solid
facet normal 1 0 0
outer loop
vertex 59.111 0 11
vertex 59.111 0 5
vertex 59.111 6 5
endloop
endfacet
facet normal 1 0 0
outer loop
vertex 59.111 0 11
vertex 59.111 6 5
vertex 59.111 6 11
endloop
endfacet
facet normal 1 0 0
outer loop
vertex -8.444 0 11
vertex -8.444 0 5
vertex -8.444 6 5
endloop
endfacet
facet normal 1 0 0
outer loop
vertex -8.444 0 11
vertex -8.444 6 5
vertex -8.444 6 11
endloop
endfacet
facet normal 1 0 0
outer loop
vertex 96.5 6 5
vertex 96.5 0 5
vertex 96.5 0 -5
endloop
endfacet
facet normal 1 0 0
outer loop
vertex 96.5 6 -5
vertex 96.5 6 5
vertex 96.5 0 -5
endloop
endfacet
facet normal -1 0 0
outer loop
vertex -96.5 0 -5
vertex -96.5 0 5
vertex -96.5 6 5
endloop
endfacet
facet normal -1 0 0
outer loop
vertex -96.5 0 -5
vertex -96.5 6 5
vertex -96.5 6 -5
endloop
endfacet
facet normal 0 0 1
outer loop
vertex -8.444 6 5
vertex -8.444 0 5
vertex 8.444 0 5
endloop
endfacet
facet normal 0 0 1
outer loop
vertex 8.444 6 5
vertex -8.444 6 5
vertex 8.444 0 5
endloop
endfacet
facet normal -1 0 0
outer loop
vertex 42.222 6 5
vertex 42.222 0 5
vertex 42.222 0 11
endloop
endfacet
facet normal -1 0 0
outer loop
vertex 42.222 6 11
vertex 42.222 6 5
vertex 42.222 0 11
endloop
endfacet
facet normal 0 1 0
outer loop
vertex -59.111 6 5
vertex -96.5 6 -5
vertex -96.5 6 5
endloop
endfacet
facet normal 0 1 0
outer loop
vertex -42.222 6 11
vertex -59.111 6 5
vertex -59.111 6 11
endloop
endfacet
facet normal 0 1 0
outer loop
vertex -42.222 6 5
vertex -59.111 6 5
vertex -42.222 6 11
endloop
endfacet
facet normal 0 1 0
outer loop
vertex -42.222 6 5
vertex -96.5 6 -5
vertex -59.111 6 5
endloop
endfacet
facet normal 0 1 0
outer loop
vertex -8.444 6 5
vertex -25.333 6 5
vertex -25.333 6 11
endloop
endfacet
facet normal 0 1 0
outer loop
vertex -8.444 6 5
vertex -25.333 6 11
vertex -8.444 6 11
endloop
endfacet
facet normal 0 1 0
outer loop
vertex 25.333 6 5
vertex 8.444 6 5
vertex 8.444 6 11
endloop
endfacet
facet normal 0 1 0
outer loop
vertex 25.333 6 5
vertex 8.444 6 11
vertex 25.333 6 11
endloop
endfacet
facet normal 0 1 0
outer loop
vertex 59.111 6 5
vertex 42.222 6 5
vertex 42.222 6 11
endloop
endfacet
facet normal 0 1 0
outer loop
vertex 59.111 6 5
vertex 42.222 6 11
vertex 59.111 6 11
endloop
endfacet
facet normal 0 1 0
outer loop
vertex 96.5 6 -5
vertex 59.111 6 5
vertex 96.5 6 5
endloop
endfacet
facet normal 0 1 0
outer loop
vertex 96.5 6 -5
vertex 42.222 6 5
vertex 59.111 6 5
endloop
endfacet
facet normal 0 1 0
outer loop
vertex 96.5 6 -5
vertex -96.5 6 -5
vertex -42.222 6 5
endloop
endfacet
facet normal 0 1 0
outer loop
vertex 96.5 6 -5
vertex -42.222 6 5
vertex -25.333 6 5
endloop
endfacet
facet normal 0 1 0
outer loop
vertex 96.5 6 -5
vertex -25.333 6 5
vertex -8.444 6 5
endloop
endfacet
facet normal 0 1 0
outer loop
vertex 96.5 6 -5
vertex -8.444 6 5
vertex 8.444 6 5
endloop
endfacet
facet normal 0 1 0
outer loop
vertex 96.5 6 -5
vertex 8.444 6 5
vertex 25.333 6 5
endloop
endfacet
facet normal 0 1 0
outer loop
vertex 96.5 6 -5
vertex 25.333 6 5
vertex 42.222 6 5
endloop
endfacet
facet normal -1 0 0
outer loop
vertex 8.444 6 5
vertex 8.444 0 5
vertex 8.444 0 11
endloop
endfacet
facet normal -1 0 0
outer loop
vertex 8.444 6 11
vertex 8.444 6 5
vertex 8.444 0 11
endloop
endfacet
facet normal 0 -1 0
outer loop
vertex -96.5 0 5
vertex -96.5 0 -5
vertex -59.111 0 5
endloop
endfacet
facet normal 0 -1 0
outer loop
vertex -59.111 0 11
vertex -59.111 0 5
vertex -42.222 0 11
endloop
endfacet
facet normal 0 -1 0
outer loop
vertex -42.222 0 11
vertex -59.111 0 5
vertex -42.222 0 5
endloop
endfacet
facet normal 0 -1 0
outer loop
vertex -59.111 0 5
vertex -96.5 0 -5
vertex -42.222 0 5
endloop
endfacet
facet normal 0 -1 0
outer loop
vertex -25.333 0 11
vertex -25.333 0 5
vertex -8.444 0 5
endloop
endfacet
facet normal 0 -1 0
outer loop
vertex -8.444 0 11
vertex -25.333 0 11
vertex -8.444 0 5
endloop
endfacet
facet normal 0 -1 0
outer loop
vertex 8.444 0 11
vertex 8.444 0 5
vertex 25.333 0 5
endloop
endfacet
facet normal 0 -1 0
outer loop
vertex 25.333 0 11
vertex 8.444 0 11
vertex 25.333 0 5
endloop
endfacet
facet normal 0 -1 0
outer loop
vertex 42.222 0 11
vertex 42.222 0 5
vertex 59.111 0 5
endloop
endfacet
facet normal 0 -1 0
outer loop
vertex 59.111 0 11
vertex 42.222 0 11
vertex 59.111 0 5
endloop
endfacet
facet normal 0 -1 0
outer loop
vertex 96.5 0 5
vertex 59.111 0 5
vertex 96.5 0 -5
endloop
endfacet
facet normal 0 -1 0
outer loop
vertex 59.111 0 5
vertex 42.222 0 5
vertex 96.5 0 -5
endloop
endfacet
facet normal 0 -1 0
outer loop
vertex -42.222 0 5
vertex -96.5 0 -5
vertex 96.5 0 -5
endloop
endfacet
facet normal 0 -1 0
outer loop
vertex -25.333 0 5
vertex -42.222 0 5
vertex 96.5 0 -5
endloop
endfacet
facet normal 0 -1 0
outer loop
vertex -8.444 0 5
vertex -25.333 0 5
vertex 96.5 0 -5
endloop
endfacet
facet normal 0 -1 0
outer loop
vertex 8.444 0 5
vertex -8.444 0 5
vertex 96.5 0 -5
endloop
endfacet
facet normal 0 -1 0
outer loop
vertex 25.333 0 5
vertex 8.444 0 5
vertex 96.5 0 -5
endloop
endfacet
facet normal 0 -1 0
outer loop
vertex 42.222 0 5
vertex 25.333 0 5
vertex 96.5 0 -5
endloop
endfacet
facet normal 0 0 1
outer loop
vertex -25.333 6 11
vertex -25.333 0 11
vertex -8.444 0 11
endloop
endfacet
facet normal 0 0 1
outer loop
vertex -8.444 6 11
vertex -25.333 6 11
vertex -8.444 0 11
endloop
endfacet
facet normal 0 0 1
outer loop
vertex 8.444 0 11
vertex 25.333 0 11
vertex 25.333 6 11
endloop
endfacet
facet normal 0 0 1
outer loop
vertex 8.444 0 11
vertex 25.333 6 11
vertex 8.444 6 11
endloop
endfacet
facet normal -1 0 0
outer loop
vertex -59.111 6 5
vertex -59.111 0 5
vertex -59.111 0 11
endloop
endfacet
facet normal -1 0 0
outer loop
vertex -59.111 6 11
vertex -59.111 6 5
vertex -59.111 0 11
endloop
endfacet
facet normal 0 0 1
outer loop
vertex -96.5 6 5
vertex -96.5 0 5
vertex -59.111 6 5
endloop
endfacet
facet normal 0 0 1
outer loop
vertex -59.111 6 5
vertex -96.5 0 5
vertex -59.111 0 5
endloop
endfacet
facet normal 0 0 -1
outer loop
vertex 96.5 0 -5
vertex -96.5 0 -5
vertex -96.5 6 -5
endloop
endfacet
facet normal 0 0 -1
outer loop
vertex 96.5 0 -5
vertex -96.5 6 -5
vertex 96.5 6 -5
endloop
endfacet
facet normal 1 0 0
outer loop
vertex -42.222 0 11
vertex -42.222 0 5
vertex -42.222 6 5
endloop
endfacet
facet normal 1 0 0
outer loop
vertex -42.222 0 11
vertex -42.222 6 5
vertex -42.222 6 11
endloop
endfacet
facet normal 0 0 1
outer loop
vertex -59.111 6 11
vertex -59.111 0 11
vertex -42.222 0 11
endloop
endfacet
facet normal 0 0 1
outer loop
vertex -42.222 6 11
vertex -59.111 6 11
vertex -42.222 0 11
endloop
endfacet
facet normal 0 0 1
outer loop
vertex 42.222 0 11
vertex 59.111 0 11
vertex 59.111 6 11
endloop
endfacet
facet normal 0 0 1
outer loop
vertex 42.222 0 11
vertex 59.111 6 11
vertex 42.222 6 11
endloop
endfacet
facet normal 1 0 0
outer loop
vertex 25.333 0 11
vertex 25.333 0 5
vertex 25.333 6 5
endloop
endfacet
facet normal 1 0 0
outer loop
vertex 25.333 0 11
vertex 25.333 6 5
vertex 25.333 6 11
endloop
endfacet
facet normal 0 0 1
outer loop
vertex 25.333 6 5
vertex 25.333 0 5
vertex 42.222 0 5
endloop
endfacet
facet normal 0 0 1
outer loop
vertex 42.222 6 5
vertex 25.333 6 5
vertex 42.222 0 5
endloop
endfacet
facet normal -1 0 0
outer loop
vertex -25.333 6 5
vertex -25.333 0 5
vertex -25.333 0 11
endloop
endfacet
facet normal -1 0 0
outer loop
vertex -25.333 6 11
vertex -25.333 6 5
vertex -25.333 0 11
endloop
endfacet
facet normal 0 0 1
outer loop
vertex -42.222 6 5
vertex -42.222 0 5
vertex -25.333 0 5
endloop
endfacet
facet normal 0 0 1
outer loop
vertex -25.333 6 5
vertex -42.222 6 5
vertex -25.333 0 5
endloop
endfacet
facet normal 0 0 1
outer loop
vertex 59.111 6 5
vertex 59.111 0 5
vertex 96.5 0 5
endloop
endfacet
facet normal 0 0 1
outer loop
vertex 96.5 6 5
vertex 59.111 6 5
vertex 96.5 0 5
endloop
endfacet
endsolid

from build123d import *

# Parameters (mm, degrees)
SKETCH1_W           = 193
SKETCH1_H           = 10
BOSS_EXTRUDE1_DEPTH = 6
SKETCH4_W           = 16.888888889
SKETCH4_H           = 6
BOSS_EXTRUDE3_DEPTH = 6


with BuildPart() as part:
    # Sketch1 → Boss-Extrude1 (new body)
    with BuildSketch(Plane(origin=(0, 0, 0), x_dir=(1, 0, 0), z_dir=(0, 1, 0))):
        Rectangle(SKETCH1_W, SKETCH1_H)
    extrude(amount=BOSS_EXTRUDE1_DEPTH)

    # Sketch4 → Boss-Extrude3 (add)
    with BuildSketch(Plane.XZ):
        with Locations((-16.888888889, 8)):
            Rectangle(SKETCH4_W, SKETCH4_H)
        with Locations((-50.666666667, 8)):
            Rectangle(SKETCH4_W, SKETCH4_H)
    boss_extrude3 = extrude(amount=-BOSS_EXTRUDE3_DEPTH)

    # Mirror1: Boss-Extrude3 across plane
    add(boss_extrude3.mirror(Plane(origin=(0, 0, 0), x_dir=(0, 0, 1), z_dir=(1, 0, 0))))


solid = part.part
